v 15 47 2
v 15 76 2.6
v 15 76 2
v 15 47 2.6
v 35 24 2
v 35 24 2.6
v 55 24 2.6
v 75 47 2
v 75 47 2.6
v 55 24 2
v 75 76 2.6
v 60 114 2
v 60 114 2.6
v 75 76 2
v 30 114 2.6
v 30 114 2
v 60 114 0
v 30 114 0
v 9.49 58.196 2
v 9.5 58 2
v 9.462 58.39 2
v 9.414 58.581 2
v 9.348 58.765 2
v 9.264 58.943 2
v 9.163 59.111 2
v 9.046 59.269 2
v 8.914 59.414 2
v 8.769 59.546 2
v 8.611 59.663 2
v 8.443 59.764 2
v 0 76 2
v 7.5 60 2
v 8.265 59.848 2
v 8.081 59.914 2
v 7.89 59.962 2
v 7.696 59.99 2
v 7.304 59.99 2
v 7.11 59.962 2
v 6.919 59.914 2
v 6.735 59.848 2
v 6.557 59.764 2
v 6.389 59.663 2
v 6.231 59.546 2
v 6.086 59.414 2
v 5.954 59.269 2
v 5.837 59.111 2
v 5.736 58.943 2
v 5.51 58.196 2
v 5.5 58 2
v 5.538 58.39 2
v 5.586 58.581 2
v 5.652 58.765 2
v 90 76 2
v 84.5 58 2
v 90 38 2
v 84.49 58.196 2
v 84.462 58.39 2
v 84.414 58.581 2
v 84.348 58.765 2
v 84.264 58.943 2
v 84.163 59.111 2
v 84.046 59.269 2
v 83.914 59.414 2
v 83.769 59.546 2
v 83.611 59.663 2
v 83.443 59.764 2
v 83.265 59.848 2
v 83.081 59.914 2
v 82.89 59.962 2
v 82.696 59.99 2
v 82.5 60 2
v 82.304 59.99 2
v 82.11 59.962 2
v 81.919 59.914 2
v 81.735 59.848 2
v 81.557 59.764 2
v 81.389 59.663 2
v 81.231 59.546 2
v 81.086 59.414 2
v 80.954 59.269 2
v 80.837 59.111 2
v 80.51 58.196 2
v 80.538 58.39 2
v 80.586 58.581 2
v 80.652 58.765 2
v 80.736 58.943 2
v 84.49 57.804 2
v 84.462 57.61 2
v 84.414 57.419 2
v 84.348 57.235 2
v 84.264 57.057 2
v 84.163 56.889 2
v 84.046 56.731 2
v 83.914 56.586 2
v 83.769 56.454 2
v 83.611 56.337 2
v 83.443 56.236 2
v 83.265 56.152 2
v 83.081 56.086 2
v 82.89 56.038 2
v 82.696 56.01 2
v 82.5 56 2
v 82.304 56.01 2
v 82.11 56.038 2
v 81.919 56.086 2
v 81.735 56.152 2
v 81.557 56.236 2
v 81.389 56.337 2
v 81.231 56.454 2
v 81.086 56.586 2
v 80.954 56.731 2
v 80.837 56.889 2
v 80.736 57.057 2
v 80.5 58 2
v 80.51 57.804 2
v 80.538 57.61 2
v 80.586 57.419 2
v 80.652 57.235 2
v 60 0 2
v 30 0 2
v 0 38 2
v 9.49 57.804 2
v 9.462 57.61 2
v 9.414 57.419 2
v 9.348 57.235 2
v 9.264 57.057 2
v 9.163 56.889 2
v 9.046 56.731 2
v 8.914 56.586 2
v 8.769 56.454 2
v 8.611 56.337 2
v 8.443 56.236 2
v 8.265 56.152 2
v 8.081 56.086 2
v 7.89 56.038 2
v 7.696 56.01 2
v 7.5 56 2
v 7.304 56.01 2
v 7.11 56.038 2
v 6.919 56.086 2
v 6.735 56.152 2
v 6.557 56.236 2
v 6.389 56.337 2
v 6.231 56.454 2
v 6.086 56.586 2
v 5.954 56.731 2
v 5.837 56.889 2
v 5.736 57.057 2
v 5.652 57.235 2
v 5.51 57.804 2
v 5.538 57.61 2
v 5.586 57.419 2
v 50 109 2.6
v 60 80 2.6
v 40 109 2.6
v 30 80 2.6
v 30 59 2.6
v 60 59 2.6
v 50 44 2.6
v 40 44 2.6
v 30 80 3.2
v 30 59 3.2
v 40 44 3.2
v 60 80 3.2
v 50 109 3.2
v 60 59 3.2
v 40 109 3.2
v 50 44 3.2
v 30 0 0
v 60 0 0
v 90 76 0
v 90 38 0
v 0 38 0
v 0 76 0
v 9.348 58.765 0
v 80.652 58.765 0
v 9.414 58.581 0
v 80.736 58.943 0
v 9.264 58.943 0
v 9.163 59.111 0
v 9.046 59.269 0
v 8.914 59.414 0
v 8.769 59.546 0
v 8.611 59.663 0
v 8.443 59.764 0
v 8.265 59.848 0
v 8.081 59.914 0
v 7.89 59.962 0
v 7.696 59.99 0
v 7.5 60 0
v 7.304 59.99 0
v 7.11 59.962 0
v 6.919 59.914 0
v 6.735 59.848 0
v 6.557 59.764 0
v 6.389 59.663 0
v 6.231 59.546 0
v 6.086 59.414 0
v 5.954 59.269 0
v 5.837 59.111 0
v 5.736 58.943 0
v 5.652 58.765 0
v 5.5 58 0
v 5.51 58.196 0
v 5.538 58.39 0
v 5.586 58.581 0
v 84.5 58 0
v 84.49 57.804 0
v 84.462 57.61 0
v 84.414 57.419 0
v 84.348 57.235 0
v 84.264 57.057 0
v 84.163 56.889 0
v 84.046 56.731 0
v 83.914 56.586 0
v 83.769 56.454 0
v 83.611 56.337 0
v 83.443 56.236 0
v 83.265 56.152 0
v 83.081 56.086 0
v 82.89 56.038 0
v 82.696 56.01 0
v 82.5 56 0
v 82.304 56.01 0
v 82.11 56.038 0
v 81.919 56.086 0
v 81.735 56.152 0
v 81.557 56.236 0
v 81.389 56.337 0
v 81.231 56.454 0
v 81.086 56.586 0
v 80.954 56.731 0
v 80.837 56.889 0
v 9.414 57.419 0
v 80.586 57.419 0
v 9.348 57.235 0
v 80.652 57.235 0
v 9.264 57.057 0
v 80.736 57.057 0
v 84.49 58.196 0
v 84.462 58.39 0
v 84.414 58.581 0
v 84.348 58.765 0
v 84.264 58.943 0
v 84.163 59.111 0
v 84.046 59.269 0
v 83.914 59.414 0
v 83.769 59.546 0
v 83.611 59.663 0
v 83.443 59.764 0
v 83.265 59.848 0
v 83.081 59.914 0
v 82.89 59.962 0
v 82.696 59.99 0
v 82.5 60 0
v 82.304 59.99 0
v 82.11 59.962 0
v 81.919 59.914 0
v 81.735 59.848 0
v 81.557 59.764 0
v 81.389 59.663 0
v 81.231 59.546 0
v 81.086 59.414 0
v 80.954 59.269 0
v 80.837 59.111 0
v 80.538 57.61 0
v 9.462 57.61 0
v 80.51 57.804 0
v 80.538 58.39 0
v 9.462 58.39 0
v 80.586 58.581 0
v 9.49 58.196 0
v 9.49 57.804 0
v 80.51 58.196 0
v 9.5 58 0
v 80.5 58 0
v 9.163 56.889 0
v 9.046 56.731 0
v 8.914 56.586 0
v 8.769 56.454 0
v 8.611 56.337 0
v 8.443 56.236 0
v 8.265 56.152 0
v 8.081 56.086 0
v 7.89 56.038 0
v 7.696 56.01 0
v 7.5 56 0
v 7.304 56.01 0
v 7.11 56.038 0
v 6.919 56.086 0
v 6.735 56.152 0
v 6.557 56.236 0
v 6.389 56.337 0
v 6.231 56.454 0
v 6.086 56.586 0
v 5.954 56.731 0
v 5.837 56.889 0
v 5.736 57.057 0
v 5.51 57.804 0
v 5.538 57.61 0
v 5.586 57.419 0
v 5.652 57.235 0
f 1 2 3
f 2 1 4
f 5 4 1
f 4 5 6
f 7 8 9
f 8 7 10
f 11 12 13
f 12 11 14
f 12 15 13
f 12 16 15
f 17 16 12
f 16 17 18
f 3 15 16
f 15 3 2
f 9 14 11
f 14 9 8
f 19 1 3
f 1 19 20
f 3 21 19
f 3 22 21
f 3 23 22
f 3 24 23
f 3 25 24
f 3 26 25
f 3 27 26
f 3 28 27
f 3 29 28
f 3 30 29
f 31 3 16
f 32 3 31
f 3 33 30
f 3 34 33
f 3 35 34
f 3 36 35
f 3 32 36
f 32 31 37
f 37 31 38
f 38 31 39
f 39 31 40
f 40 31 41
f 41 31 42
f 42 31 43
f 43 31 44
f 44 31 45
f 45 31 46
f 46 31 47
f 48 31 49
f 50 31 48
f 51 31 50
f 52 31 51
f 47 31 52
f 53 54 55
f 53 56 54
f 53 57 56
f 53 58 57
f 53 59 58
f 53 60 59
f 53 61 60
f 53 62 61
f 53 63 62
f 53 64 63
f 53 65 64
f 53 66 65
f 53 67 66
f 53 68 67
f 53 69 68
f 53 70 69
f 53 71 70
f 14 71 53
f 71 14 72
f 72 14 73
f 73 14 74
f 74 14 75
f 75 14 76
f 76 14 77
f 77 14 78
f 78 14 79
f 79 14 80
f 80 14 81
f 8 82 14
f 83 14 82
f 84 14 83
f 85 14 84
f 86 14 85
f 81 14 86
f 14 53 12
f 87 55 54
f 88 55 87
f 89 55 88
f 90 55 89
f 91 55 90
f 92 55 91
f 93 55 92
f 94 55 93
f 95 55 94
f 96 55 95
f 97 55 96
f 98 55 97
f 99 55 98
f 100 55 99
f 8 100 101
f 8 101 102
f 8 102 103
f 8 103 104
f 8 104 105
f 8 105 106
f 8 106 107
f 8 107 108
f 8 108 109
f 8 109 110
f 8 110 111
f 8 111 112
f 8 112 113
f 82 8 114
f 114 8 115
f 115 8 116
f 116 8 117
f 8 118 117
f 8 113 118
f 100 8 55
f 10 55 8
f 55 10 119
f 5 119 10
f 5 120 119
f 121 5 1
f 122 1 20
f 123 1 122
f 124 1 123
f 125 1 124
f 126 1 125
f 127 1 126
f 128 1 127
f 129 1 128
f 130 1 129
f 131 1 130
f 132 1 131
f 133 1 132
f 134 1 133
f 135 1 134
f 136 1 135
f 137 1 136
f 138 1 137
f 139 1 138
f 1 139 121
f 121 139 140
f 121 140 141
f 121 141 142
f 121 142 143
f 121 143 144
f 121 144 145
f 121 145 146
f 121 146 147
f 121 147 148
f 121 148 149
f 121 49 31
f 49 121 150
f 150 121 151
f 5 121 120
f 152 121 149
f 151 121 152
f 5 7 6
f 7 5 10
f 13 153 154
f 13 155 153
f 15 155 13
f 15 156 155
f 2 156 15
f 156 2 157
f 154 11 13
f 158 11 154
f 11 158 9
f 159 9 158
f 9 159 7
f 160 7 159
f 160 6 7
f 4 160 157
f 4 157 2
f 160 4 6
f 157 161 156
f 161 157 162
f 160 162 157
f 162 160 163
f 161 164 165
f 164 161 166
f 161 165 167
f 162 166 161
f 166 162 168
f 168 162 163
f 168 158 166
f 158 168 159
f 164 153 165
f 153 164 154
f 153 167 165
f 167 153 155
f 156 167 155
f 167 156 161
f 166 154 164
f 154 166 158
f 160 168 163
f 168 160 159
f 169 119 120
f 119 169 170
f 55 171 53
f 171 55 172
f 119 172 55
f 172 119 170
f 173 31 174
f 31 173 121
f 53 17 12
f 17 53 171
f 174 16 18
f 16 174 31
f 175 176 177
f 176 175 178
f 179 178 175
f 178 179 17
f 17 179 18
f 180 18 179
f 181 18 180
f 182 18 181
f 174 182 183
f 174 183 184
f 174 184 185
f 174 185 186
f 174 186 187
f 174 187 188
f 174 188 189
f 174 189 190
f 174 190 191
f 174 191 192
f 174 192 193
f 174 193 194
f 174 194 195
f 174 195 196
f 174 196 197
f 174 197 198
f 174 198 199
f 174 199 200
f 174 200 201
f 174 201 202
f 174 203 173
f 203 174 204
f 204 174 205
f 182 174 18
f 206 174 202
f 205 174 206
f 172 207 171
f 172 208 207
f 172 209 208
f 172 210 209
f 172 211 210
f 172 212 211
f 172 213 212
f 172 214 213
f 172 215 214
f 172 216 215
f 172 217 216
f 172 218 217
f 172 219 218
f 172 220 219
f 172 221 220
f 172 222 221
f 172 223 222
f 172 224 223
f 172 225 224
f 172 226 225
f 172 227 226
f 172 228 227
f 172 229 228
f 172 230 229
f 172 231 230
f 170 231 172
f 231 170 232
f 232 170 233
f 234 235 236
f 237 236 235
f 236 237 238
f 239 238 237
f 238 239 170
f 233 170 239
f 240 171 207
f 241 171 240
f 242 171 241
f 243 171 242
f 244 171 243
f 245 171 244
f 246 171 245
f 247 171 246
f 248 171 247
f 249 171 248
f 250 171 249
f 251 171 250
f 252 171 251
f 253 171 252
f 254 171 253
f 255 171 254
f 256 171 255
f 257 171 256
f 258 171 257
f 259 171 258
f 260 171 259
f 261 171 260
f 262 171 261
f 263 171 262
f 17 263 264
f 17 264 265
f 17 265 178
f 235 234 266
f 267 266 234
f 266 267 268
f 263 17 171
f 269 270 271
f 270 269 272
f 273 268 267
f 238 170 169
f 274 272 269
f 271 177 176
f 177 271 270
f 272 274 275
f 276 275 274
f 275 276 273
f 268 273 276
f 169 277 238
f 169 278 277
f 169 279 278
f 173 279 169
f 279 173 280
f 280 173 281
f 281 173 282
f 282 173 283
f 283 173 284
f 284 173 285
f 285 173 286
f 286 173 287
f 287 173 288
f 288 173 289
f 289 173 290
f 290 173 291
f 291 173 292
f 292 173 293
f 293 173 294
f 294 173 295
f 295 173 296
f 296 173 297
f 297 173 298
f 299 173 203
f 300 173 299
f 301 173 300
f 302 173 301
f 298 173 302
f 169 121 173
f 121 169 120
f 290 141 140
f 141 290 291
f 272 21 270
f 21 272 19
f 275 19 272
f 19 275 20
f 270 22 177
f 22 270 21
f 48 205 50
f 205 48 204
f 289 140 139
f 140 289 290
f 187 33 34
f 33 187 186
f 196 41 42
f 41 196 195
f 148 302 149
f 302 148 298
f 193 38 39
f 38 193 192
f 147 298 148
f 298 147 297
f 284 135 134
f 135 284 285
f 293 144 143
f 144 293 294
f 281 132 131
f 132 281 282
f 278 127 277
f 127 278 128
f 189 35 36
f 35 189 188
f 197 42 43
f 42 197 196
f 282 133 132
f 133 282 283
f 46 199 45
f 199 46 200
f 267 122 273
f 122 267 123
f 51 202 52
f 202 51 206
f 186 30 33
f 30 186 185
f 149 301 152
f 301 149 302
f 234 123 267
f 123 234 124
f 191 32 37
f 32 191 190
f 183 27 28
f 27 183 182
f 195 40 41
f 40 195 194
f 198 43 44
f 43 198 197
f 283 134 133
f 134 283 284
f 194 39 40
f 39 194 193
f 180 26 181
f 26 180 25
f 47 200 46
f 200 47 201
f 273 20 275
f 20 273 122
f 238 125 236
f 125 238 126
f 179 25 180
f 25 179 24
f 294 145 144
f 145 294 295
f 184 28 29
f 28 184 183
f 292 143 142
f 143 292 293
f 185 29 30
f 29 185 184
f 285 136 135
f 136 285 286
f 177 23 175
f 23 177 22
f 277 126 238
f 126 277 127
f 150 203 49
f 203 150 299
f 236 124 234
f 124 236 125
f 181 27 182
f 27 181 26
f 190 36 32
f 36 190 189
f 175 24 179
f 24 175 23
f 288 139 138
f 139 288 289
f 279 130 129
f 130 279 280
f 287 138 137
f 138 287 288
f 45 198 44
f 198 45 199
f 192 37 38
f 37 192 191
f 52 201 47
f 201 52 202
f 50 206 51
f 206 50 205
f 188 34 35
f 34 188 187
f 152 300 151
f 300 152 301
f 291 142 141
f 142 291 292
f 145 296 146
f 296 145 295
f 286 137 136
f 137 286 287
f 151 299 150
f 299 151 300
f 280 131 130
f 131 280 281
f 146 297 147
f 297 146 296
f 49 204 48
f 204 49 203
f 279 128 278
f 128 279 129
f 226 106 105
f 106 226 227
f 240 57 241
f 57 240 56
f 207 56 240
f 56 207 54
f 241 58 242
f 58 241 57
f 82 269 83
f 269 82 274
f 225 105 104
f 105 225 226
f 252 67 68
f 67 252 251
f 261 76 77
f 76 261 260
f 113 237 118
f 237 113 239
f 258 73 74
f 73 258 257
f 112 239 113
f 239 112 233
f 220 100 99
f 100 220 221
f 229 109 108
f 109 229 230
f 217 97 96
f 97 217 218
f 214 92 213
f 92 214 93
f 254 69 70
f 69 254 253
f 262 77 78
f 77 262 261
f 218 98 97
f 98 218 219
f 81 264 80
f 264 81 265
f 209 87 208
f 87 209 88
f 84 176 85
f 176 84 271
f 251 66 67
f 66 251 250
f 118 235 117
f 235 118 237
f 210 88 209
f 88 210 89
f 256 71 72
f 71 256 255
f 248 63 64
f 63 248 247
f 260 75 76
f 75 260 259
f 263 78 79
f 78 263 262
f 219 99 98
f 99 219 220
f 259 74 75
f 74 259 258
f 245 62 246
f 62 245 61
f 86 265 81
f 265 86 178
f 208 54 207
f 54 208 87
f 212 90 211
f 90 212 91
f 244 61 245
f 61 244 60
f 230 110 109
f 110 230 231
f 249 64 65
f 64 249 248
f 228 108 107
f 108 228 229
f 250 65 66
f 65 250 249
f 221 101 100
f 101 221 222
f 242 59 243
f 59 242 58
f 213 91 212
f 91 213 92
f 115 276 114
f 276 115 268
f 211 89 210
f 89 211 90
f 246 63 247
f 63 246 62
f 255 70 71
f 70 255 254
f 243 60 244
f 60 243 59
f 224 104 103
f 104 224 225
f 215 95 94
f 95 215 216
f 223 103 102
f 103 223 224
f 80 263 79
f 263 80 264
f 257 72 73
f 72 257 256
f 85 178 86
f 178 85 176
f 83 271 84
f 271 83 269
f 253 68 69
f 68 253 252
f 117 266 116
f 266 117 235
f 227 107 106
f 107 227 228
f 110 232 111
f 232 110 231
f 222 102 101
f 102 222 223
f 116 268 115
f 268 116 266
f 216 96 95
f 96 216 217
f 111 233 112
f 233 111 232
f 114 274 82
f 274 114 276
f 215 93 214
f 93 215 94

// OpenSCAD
// Scaled IPSC targets for dry fire / airsoft practice.
//
// Geometry read off the IPSC target diagram (ipsc.org "The IPSC Target",
// see ~/Documents/make-ready/kb/equipment/targets-and-mags.md).
// All real-world dimensions are in cm and scaled to mm at the end.
//
// Angular size rule: a 1:N target at home distance d looks like the real
// target at N*d. E.g. 1:5 at 2 m = full target at 10 m.
//
// Render one part at a time, e.g.:
//   openscad -D 'scale_n=5' -D 'part="target"' -o target_1-5.stl targets.scad

/* [Main] */
// Scale denominator: 4 = 1:4, 5 = 1:5, 6 = 1:6
scale_n = 5;
// What to render
part = "target"; // [target, mini, stand, popper, plate, assembly]

/* [Plate] */
// Plate thickness in mm (not scaled)
thickness = 2.0;
// "groove": zone lines cut into the face. "raised": zones stepped up so you
// can change filament colour at a layer height (heights echoed to console).
zone_style = "raised"; // [groove, raised]
// Groove width and depth in mm
groove_w = 1.2;
groove_d = 0.8;
// Height of each raised step in mm
step_h = 0.6;
// Two hanging holes in the side D strips (0 = none), mm diameter
hang_hole = 4;

/* [Stand] */
// Slot clearance around the plate in mm
slot_clearance = 0.3;
// Stand footprint in mm
stand_w = 60;
stand_d = 40;
// Lean the target back this many degrees (0 = upright)
stand_tilt = 5;
stand_h = 12;

$fn = 64;

s = 10 / scale_n; // cm -> mm, then scaled

// ---- Real-size outlines (cm, origin top-left, y down) ----
// Outer edge incl. the 0.5 cm non-scoring border.
outer_cm = [[15,0],[30,0],[45,19],[45,38],[30,57],[15,57],[0,38],[0,19]];
// C zone (shares the top edge with the target).
c_cm     = [[15,0],[30,0],[37.5,19],[37.5,33.5],[27.5,45],[17.5,45],[7.5,33.5],[7.5,19]];
// A zone, 15 x ~32.5 cm. The upper side start (17) is not dimensioned on the
// diagram; read off the drawing.
a_cm     = [[20,2.5],[25,2.5],[30,17],[30,27.5],[25,35],[20,35],[15,27.5],[15,17]];

// Mini target is ~2/3 of the full target (30 x 37.5 cm per IPSC B3).
mini_k = 30 / 45;

function flip(pts, h) = [for (p = pts) [p[0], h - p[1]]];   // y up for OpenSCAD
function sc(pts, k)   = [for (p = pts) p * k];

module outline(pts, k) { polygon(sc(flip(pts, 57), k * s)); }

module target_plate(k = 1) {
    w = 45 * k * s;
    h = 57 * k * s;
    difference() {
        union() {
            linear_extrude(thickness) outline(outer_cm, k);
            if (zone_style == "raised") {
                // D border step (inside the 0.5 cm border) is the base plate.
                color("orange") translate([0,0,thickness]) linear_extrude(step_h) outline(c_cm, k);
                color("white") translate([0,0,thickness + step_h]) linear_extrude(step_h) outline(a_cm, k);
            }
        }
        if (zone_style == "groove") {
            for (z = [c_cm, a_cm])
                translate([0,0,thickness - groove_d])
                    linear_extrude(groove_d + 0.01)
                        difference() {
                            offset(delta =  groove_w/2) outline(z, k);
                            offset(delta = -groove_w/2) outline(z, k);
                        }
        }
        if (hang_hole > 0)
            for (x = [3.75, 41.25])
                translate([x * k * s, h - 28 * k * s, -1]) cylinder(d = hang_hole, h = 50);
    }
    if (zone_style == "raised") {
        echo(str("Colour change for C zone at Z = ", thickness, " mm"));
        echo(str("Colour change for A zone at Z = ", thickness + step_h, " mm"));
    }
    echo(str("Target size: ", w, " x ", h, " mm (1:", scale_n, ")"));
}

// Table stand: a wide, low foot with a slot the plate's bottom edge drops
// into. Sized from the target so every scale gets a matching stand.
module stand(k = 1) {
    slot   = thickness + 2 * slot_clearance;
    edge_w = 15 * k * s;                      // flat bottom edge of the target
    w      = max(stand_w, edge_w + 30);
    d      = max(stand_d, 57 * k * s * 0.35); // deeper foot for taller targets
    difference() {
        hull() {
            translate([-w/2, -d/2, 0]) cube([w, d, 2]);
            translate([-w/2 + 6, -slot/2 - 4, 0]) cube([w - 12, slot + 8, stand_h]);
        }
        // Slot, tilted back by stand_tilt so the target leans away from you.
        translate([0, 0, 2])
            rotate([-stand_tilt, 0, 0])
                translate([-w/2 - 1, -slot/2, 0]) cube([w + 2, slot, stand_h * 2]);
    }
}

// Target standing in its foot, for checking the fit on screen only.
module assembly(k = 1) {
    stand(k);
    color("gray")
        translate([-22.5 * k * s, thickness/2, 2])
            rotate([-stand_tilt, 0, 0]) rotate([90, 0, 0]) target_plate(k);
}

// Approximate IPSC popper: 85 cm tall, 30 cm head, 15 cm base. The neck shape
// is not taken from a diagram; treat it as a stand-in.
module popper(k = 1) {
    linear_extrude(thickness)
        scale(k * s) union() {
            translate([0, 70]) circle(r = 15);
            polygon([[-7.5,0],[7.5,0],[5,60],[8,70],[-8,70],[-5,60]]);
        }
}

if (part == "target") target_plate(1);
else if (part == "mini") target_plate(mini_k);
else if (part == "popper") popper(1);
else if (part == "stand") stand();
else if (part == "assembly") assembly();
else if (part == "plate") {
    // Target + its stand laid out for one print.
    target_plate(1);
    translate([45 * s + 20 + max(stand_w, 15 * s + 30)/2, max(stand_d, 57 * s * 0.35)/2, 0]) stand();
}
